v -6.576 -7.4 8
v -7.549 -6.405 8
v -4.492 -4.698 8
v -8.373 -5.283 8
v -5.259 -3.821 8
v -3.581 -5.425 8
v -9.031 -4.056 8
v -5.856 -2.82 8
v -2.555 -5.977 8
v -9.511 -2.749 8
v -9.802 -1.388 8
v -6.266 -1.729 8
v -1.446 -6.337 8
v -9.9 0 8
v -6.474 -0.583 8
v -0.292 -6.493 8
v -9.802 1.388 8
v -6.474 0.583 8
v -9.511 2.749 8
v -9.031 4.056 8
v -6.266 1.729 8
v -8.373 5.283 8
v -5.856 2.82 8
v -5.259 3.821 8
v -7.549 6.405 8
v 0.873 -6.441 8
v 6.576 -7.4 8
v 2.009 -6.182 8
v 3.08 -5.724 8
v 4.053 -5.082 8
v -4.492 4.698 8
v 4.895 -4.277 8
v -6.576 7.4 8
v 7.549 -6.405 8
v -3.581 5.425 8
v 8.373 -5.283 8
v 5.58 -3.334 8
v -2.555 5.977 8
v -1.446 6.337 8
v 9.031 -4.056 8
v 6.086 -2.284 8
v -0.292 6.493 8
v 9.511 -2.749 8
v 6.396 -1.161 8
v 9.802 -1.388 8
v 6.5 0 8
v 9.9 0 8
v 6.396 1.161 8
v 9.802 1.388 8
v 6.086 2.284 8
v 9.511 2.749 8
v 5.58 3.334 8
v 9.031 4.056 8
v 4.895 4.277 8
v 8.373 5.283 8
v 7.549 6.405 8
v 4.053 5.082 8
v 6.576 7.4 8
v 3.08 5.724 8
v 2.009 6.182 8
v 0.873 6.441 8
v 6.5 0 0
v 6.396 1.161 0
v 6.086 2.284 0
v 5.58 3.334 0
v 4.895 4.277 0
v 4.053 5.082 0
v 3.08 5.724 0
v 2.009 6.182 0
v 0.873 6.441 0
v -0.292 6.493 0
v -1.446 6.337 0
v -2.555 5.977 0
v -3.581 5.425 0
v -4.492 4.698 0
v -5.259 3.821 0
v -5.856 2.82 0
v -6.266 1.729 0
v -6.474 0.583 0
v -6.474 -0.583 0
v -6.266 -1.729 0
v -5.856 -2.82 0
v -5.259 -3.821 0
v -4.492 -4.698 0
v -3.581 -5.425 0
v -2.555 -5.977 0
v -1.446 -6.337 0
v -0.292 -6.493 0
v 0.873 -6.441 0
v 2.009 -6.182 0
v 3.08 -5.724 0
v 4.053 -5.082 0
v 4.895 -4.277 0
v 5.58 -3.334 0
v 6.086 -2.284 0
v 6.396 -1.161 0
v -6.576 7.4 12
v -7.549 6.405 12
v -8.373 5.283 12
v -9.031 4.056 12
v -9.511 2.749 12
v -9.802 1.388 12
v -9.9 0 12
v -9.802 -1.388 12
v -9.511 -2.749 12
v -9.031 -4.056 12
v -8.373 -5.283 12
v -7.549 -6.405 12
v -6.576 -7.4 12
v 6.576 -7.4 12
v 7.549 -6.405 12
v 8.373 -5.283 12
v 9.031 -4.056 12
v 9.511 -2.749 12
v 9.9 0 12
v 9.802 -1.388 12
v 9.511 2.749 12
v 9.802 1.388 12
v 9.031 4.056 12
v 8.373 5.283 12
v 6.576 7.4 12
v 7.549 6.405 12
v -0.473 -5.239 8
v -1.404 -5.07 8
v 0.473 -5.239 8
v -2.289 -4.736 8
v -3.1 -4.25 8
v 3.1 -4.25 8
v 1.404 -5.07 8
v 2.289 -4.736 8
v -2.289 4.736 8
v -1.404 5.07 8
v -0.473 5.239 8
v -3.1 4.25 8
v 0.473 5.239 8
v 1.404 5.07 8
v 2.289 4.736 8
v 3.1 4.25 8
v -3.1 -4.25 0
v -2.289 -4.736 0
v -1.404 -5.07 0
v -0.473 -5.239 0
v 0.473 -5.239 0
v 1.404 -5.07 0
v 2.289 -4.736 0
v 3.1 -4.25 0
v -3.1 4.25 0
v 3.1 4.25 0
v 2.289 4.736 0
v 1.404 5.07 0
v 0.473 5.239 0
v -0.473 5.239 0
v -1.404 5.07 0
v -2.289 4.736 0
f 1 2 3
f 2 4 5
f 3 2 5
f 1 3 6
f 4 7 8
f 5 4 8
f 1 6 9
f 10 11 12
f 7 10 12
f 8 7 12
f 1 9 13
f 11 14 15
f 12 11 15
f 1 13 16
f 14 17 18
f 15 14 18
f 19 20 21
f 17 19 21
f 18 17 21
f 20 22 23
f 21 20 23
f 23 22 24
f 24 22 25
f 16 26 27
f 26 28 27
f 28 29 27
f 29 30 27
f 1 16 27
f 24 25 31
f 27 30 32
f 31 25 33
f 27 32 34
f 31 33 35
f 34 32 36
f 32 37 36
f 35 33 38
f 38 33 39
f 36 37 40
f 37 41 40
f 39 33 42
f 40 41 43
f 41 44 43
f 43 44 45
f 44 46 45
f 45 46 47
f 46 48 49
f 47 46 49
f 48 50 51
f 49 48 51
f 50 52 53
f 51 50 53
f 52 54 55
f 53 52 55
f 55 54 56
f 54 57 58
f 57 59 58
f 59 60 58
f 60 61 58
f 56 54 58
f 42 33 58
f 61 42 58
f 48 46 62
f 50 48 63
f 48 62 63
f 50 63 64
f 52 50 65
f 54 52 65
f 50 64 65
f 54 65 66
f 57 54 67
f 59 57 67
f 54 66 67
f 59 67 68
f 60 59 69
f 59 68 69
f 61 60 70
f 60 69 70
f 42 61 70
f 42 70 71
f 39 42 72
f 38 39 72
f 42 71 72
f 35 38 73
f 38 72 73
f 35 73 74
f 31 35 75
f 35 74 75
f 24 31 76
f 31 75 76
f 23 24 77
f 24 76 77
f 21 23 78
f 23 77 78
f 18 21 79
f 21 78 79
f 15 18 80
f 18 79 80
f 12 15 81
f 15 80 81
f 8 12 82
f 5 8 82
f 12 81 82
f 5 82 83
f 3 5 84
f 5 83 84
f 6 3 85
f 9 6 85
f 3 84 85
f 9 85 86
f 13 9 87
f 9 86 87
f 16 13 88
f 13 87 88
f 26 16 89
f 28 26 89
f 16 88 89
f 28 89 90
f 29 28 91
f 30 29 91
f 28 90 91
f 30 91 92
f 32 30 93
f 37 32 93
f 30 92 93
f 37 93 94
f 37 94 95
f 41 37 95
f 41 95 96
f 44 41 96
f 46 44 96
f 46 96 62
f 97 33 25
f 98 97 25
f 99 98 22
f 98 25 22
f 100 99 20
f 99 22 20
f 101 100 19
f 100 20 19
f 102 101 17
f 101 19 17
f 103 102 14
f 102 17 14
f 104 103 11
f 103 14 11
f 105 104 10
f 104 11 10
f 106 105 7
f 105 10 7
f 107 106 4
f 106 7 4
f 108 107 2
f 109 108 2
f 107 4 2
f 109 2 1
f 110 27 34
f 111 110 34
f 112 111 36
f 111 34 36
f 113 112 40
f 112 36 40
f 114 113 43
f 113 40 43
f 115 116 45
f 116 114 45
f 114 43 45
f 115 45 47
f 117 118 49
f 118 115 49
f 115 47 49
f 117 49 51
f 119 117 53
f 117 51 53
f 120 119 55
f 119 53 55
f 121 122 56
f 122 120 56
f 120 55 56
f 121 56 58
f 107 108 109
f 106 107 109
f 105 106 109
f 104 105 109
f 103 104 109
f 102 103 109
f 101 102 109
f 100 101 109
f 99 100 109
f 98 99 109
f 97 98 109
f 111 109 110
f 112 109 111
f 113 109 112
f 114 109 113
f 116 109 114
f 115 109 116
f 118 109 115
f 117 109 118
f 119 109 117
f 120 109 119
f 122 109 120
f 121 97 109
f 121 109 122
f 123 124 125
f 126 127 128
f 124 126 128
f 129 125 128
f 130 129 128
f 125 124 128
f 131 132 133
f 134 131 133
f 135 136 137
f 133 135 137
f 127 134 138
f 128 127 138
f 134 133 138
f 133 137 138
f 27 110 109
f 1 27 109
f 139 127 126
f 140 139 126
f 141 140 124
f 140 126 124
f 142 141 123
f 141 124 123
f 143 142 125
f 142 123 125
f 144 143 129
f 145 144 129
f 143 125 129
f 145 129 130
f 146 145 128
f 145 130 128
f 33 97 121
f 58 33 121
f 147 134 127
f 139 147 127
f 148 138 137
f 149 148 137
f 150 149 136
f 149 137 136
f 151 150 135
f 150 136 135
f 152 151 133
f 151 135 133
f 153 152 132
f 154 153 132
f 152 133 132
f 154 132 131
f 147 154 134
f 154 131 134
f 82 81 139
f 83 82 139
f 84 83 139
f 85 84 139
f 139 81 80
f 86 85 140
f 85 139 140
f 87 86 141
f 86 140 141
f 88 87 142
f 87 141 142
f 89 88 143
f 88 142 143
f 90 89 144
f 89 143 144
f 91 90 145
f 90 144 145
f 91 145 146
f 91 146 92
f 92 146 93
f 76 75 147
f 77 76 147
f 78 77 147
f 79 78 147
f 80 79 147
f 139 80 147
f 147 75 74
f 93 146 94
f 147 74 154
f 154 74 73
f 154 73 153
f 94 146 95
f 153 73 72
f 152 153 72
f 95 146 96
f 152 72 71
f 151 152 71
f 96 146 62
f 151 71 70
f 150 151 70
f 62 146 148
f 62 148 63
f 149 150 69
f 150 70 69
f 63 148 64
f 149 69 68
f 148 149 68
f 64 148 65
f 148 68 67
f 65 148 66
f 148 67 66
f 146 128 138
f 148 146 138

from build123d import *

# Parameters (mm, degrees)
F0_R     = 6.5
F1_DEPTH = 8
F3_DEPTH = 8
F4_R     = 9.9
F5_DEPTH = 4
F7_DEPTH = 4


with BuildPart() as f1:
    # F0 (on Top) → F1 (new body)
    with BuildSketch(Plane.XY):
        Circle(F0_R)
    extrude(amount=F1_DEPTH)

    # F2 (on face) → F3 (cut, through all)
    with BuildSketch(Plane.XY.offset(8)):
        with BuildLine():
            ThreePointArc((3.1, 4.25), (0, 5.260466), (-3.1, 4.25))
            Line((-3.1, 4.25), (-3.1, -4.25))
            ThreePointArc((-3.1, -4.25), (0, -5.260466), (3.1, -4.25))
            Line((3.1, -4.25), (3.1, 4.25))
        make_face()
    extrude(amount=-F3_DEPTH, mode=Mode.SUBTRACT)

    # F4 (on face) → F5 (join)
    with BuildSketch(Plane.XY.offset(8)):
        Circle(F4_R)
    extrude(amount=F5_DEPTH)

    # F6 (on face) → F7 (cut, through all)
    with BuildSketch(Plane.XY.offset(12)):
        with BuildLine():
            ThreePointArc((6.576473, 7.4), (0, 9.9), (-6.576473, 7.4))
            Line((-6.576473, 7.4), (6.576473, 7.4))
        make_face()
        with BuildLine():
            Line((6.576473, -7.4), (-6.576473, -7.4))
            ThreePointArc((-6.576473, -7.4), (0, -9.9), (6.576473, -7.4))
        make_face()
    extrude(amount=-F7_DEPTH, mode=Mode.SUBTRACT)


solid = f1.part
